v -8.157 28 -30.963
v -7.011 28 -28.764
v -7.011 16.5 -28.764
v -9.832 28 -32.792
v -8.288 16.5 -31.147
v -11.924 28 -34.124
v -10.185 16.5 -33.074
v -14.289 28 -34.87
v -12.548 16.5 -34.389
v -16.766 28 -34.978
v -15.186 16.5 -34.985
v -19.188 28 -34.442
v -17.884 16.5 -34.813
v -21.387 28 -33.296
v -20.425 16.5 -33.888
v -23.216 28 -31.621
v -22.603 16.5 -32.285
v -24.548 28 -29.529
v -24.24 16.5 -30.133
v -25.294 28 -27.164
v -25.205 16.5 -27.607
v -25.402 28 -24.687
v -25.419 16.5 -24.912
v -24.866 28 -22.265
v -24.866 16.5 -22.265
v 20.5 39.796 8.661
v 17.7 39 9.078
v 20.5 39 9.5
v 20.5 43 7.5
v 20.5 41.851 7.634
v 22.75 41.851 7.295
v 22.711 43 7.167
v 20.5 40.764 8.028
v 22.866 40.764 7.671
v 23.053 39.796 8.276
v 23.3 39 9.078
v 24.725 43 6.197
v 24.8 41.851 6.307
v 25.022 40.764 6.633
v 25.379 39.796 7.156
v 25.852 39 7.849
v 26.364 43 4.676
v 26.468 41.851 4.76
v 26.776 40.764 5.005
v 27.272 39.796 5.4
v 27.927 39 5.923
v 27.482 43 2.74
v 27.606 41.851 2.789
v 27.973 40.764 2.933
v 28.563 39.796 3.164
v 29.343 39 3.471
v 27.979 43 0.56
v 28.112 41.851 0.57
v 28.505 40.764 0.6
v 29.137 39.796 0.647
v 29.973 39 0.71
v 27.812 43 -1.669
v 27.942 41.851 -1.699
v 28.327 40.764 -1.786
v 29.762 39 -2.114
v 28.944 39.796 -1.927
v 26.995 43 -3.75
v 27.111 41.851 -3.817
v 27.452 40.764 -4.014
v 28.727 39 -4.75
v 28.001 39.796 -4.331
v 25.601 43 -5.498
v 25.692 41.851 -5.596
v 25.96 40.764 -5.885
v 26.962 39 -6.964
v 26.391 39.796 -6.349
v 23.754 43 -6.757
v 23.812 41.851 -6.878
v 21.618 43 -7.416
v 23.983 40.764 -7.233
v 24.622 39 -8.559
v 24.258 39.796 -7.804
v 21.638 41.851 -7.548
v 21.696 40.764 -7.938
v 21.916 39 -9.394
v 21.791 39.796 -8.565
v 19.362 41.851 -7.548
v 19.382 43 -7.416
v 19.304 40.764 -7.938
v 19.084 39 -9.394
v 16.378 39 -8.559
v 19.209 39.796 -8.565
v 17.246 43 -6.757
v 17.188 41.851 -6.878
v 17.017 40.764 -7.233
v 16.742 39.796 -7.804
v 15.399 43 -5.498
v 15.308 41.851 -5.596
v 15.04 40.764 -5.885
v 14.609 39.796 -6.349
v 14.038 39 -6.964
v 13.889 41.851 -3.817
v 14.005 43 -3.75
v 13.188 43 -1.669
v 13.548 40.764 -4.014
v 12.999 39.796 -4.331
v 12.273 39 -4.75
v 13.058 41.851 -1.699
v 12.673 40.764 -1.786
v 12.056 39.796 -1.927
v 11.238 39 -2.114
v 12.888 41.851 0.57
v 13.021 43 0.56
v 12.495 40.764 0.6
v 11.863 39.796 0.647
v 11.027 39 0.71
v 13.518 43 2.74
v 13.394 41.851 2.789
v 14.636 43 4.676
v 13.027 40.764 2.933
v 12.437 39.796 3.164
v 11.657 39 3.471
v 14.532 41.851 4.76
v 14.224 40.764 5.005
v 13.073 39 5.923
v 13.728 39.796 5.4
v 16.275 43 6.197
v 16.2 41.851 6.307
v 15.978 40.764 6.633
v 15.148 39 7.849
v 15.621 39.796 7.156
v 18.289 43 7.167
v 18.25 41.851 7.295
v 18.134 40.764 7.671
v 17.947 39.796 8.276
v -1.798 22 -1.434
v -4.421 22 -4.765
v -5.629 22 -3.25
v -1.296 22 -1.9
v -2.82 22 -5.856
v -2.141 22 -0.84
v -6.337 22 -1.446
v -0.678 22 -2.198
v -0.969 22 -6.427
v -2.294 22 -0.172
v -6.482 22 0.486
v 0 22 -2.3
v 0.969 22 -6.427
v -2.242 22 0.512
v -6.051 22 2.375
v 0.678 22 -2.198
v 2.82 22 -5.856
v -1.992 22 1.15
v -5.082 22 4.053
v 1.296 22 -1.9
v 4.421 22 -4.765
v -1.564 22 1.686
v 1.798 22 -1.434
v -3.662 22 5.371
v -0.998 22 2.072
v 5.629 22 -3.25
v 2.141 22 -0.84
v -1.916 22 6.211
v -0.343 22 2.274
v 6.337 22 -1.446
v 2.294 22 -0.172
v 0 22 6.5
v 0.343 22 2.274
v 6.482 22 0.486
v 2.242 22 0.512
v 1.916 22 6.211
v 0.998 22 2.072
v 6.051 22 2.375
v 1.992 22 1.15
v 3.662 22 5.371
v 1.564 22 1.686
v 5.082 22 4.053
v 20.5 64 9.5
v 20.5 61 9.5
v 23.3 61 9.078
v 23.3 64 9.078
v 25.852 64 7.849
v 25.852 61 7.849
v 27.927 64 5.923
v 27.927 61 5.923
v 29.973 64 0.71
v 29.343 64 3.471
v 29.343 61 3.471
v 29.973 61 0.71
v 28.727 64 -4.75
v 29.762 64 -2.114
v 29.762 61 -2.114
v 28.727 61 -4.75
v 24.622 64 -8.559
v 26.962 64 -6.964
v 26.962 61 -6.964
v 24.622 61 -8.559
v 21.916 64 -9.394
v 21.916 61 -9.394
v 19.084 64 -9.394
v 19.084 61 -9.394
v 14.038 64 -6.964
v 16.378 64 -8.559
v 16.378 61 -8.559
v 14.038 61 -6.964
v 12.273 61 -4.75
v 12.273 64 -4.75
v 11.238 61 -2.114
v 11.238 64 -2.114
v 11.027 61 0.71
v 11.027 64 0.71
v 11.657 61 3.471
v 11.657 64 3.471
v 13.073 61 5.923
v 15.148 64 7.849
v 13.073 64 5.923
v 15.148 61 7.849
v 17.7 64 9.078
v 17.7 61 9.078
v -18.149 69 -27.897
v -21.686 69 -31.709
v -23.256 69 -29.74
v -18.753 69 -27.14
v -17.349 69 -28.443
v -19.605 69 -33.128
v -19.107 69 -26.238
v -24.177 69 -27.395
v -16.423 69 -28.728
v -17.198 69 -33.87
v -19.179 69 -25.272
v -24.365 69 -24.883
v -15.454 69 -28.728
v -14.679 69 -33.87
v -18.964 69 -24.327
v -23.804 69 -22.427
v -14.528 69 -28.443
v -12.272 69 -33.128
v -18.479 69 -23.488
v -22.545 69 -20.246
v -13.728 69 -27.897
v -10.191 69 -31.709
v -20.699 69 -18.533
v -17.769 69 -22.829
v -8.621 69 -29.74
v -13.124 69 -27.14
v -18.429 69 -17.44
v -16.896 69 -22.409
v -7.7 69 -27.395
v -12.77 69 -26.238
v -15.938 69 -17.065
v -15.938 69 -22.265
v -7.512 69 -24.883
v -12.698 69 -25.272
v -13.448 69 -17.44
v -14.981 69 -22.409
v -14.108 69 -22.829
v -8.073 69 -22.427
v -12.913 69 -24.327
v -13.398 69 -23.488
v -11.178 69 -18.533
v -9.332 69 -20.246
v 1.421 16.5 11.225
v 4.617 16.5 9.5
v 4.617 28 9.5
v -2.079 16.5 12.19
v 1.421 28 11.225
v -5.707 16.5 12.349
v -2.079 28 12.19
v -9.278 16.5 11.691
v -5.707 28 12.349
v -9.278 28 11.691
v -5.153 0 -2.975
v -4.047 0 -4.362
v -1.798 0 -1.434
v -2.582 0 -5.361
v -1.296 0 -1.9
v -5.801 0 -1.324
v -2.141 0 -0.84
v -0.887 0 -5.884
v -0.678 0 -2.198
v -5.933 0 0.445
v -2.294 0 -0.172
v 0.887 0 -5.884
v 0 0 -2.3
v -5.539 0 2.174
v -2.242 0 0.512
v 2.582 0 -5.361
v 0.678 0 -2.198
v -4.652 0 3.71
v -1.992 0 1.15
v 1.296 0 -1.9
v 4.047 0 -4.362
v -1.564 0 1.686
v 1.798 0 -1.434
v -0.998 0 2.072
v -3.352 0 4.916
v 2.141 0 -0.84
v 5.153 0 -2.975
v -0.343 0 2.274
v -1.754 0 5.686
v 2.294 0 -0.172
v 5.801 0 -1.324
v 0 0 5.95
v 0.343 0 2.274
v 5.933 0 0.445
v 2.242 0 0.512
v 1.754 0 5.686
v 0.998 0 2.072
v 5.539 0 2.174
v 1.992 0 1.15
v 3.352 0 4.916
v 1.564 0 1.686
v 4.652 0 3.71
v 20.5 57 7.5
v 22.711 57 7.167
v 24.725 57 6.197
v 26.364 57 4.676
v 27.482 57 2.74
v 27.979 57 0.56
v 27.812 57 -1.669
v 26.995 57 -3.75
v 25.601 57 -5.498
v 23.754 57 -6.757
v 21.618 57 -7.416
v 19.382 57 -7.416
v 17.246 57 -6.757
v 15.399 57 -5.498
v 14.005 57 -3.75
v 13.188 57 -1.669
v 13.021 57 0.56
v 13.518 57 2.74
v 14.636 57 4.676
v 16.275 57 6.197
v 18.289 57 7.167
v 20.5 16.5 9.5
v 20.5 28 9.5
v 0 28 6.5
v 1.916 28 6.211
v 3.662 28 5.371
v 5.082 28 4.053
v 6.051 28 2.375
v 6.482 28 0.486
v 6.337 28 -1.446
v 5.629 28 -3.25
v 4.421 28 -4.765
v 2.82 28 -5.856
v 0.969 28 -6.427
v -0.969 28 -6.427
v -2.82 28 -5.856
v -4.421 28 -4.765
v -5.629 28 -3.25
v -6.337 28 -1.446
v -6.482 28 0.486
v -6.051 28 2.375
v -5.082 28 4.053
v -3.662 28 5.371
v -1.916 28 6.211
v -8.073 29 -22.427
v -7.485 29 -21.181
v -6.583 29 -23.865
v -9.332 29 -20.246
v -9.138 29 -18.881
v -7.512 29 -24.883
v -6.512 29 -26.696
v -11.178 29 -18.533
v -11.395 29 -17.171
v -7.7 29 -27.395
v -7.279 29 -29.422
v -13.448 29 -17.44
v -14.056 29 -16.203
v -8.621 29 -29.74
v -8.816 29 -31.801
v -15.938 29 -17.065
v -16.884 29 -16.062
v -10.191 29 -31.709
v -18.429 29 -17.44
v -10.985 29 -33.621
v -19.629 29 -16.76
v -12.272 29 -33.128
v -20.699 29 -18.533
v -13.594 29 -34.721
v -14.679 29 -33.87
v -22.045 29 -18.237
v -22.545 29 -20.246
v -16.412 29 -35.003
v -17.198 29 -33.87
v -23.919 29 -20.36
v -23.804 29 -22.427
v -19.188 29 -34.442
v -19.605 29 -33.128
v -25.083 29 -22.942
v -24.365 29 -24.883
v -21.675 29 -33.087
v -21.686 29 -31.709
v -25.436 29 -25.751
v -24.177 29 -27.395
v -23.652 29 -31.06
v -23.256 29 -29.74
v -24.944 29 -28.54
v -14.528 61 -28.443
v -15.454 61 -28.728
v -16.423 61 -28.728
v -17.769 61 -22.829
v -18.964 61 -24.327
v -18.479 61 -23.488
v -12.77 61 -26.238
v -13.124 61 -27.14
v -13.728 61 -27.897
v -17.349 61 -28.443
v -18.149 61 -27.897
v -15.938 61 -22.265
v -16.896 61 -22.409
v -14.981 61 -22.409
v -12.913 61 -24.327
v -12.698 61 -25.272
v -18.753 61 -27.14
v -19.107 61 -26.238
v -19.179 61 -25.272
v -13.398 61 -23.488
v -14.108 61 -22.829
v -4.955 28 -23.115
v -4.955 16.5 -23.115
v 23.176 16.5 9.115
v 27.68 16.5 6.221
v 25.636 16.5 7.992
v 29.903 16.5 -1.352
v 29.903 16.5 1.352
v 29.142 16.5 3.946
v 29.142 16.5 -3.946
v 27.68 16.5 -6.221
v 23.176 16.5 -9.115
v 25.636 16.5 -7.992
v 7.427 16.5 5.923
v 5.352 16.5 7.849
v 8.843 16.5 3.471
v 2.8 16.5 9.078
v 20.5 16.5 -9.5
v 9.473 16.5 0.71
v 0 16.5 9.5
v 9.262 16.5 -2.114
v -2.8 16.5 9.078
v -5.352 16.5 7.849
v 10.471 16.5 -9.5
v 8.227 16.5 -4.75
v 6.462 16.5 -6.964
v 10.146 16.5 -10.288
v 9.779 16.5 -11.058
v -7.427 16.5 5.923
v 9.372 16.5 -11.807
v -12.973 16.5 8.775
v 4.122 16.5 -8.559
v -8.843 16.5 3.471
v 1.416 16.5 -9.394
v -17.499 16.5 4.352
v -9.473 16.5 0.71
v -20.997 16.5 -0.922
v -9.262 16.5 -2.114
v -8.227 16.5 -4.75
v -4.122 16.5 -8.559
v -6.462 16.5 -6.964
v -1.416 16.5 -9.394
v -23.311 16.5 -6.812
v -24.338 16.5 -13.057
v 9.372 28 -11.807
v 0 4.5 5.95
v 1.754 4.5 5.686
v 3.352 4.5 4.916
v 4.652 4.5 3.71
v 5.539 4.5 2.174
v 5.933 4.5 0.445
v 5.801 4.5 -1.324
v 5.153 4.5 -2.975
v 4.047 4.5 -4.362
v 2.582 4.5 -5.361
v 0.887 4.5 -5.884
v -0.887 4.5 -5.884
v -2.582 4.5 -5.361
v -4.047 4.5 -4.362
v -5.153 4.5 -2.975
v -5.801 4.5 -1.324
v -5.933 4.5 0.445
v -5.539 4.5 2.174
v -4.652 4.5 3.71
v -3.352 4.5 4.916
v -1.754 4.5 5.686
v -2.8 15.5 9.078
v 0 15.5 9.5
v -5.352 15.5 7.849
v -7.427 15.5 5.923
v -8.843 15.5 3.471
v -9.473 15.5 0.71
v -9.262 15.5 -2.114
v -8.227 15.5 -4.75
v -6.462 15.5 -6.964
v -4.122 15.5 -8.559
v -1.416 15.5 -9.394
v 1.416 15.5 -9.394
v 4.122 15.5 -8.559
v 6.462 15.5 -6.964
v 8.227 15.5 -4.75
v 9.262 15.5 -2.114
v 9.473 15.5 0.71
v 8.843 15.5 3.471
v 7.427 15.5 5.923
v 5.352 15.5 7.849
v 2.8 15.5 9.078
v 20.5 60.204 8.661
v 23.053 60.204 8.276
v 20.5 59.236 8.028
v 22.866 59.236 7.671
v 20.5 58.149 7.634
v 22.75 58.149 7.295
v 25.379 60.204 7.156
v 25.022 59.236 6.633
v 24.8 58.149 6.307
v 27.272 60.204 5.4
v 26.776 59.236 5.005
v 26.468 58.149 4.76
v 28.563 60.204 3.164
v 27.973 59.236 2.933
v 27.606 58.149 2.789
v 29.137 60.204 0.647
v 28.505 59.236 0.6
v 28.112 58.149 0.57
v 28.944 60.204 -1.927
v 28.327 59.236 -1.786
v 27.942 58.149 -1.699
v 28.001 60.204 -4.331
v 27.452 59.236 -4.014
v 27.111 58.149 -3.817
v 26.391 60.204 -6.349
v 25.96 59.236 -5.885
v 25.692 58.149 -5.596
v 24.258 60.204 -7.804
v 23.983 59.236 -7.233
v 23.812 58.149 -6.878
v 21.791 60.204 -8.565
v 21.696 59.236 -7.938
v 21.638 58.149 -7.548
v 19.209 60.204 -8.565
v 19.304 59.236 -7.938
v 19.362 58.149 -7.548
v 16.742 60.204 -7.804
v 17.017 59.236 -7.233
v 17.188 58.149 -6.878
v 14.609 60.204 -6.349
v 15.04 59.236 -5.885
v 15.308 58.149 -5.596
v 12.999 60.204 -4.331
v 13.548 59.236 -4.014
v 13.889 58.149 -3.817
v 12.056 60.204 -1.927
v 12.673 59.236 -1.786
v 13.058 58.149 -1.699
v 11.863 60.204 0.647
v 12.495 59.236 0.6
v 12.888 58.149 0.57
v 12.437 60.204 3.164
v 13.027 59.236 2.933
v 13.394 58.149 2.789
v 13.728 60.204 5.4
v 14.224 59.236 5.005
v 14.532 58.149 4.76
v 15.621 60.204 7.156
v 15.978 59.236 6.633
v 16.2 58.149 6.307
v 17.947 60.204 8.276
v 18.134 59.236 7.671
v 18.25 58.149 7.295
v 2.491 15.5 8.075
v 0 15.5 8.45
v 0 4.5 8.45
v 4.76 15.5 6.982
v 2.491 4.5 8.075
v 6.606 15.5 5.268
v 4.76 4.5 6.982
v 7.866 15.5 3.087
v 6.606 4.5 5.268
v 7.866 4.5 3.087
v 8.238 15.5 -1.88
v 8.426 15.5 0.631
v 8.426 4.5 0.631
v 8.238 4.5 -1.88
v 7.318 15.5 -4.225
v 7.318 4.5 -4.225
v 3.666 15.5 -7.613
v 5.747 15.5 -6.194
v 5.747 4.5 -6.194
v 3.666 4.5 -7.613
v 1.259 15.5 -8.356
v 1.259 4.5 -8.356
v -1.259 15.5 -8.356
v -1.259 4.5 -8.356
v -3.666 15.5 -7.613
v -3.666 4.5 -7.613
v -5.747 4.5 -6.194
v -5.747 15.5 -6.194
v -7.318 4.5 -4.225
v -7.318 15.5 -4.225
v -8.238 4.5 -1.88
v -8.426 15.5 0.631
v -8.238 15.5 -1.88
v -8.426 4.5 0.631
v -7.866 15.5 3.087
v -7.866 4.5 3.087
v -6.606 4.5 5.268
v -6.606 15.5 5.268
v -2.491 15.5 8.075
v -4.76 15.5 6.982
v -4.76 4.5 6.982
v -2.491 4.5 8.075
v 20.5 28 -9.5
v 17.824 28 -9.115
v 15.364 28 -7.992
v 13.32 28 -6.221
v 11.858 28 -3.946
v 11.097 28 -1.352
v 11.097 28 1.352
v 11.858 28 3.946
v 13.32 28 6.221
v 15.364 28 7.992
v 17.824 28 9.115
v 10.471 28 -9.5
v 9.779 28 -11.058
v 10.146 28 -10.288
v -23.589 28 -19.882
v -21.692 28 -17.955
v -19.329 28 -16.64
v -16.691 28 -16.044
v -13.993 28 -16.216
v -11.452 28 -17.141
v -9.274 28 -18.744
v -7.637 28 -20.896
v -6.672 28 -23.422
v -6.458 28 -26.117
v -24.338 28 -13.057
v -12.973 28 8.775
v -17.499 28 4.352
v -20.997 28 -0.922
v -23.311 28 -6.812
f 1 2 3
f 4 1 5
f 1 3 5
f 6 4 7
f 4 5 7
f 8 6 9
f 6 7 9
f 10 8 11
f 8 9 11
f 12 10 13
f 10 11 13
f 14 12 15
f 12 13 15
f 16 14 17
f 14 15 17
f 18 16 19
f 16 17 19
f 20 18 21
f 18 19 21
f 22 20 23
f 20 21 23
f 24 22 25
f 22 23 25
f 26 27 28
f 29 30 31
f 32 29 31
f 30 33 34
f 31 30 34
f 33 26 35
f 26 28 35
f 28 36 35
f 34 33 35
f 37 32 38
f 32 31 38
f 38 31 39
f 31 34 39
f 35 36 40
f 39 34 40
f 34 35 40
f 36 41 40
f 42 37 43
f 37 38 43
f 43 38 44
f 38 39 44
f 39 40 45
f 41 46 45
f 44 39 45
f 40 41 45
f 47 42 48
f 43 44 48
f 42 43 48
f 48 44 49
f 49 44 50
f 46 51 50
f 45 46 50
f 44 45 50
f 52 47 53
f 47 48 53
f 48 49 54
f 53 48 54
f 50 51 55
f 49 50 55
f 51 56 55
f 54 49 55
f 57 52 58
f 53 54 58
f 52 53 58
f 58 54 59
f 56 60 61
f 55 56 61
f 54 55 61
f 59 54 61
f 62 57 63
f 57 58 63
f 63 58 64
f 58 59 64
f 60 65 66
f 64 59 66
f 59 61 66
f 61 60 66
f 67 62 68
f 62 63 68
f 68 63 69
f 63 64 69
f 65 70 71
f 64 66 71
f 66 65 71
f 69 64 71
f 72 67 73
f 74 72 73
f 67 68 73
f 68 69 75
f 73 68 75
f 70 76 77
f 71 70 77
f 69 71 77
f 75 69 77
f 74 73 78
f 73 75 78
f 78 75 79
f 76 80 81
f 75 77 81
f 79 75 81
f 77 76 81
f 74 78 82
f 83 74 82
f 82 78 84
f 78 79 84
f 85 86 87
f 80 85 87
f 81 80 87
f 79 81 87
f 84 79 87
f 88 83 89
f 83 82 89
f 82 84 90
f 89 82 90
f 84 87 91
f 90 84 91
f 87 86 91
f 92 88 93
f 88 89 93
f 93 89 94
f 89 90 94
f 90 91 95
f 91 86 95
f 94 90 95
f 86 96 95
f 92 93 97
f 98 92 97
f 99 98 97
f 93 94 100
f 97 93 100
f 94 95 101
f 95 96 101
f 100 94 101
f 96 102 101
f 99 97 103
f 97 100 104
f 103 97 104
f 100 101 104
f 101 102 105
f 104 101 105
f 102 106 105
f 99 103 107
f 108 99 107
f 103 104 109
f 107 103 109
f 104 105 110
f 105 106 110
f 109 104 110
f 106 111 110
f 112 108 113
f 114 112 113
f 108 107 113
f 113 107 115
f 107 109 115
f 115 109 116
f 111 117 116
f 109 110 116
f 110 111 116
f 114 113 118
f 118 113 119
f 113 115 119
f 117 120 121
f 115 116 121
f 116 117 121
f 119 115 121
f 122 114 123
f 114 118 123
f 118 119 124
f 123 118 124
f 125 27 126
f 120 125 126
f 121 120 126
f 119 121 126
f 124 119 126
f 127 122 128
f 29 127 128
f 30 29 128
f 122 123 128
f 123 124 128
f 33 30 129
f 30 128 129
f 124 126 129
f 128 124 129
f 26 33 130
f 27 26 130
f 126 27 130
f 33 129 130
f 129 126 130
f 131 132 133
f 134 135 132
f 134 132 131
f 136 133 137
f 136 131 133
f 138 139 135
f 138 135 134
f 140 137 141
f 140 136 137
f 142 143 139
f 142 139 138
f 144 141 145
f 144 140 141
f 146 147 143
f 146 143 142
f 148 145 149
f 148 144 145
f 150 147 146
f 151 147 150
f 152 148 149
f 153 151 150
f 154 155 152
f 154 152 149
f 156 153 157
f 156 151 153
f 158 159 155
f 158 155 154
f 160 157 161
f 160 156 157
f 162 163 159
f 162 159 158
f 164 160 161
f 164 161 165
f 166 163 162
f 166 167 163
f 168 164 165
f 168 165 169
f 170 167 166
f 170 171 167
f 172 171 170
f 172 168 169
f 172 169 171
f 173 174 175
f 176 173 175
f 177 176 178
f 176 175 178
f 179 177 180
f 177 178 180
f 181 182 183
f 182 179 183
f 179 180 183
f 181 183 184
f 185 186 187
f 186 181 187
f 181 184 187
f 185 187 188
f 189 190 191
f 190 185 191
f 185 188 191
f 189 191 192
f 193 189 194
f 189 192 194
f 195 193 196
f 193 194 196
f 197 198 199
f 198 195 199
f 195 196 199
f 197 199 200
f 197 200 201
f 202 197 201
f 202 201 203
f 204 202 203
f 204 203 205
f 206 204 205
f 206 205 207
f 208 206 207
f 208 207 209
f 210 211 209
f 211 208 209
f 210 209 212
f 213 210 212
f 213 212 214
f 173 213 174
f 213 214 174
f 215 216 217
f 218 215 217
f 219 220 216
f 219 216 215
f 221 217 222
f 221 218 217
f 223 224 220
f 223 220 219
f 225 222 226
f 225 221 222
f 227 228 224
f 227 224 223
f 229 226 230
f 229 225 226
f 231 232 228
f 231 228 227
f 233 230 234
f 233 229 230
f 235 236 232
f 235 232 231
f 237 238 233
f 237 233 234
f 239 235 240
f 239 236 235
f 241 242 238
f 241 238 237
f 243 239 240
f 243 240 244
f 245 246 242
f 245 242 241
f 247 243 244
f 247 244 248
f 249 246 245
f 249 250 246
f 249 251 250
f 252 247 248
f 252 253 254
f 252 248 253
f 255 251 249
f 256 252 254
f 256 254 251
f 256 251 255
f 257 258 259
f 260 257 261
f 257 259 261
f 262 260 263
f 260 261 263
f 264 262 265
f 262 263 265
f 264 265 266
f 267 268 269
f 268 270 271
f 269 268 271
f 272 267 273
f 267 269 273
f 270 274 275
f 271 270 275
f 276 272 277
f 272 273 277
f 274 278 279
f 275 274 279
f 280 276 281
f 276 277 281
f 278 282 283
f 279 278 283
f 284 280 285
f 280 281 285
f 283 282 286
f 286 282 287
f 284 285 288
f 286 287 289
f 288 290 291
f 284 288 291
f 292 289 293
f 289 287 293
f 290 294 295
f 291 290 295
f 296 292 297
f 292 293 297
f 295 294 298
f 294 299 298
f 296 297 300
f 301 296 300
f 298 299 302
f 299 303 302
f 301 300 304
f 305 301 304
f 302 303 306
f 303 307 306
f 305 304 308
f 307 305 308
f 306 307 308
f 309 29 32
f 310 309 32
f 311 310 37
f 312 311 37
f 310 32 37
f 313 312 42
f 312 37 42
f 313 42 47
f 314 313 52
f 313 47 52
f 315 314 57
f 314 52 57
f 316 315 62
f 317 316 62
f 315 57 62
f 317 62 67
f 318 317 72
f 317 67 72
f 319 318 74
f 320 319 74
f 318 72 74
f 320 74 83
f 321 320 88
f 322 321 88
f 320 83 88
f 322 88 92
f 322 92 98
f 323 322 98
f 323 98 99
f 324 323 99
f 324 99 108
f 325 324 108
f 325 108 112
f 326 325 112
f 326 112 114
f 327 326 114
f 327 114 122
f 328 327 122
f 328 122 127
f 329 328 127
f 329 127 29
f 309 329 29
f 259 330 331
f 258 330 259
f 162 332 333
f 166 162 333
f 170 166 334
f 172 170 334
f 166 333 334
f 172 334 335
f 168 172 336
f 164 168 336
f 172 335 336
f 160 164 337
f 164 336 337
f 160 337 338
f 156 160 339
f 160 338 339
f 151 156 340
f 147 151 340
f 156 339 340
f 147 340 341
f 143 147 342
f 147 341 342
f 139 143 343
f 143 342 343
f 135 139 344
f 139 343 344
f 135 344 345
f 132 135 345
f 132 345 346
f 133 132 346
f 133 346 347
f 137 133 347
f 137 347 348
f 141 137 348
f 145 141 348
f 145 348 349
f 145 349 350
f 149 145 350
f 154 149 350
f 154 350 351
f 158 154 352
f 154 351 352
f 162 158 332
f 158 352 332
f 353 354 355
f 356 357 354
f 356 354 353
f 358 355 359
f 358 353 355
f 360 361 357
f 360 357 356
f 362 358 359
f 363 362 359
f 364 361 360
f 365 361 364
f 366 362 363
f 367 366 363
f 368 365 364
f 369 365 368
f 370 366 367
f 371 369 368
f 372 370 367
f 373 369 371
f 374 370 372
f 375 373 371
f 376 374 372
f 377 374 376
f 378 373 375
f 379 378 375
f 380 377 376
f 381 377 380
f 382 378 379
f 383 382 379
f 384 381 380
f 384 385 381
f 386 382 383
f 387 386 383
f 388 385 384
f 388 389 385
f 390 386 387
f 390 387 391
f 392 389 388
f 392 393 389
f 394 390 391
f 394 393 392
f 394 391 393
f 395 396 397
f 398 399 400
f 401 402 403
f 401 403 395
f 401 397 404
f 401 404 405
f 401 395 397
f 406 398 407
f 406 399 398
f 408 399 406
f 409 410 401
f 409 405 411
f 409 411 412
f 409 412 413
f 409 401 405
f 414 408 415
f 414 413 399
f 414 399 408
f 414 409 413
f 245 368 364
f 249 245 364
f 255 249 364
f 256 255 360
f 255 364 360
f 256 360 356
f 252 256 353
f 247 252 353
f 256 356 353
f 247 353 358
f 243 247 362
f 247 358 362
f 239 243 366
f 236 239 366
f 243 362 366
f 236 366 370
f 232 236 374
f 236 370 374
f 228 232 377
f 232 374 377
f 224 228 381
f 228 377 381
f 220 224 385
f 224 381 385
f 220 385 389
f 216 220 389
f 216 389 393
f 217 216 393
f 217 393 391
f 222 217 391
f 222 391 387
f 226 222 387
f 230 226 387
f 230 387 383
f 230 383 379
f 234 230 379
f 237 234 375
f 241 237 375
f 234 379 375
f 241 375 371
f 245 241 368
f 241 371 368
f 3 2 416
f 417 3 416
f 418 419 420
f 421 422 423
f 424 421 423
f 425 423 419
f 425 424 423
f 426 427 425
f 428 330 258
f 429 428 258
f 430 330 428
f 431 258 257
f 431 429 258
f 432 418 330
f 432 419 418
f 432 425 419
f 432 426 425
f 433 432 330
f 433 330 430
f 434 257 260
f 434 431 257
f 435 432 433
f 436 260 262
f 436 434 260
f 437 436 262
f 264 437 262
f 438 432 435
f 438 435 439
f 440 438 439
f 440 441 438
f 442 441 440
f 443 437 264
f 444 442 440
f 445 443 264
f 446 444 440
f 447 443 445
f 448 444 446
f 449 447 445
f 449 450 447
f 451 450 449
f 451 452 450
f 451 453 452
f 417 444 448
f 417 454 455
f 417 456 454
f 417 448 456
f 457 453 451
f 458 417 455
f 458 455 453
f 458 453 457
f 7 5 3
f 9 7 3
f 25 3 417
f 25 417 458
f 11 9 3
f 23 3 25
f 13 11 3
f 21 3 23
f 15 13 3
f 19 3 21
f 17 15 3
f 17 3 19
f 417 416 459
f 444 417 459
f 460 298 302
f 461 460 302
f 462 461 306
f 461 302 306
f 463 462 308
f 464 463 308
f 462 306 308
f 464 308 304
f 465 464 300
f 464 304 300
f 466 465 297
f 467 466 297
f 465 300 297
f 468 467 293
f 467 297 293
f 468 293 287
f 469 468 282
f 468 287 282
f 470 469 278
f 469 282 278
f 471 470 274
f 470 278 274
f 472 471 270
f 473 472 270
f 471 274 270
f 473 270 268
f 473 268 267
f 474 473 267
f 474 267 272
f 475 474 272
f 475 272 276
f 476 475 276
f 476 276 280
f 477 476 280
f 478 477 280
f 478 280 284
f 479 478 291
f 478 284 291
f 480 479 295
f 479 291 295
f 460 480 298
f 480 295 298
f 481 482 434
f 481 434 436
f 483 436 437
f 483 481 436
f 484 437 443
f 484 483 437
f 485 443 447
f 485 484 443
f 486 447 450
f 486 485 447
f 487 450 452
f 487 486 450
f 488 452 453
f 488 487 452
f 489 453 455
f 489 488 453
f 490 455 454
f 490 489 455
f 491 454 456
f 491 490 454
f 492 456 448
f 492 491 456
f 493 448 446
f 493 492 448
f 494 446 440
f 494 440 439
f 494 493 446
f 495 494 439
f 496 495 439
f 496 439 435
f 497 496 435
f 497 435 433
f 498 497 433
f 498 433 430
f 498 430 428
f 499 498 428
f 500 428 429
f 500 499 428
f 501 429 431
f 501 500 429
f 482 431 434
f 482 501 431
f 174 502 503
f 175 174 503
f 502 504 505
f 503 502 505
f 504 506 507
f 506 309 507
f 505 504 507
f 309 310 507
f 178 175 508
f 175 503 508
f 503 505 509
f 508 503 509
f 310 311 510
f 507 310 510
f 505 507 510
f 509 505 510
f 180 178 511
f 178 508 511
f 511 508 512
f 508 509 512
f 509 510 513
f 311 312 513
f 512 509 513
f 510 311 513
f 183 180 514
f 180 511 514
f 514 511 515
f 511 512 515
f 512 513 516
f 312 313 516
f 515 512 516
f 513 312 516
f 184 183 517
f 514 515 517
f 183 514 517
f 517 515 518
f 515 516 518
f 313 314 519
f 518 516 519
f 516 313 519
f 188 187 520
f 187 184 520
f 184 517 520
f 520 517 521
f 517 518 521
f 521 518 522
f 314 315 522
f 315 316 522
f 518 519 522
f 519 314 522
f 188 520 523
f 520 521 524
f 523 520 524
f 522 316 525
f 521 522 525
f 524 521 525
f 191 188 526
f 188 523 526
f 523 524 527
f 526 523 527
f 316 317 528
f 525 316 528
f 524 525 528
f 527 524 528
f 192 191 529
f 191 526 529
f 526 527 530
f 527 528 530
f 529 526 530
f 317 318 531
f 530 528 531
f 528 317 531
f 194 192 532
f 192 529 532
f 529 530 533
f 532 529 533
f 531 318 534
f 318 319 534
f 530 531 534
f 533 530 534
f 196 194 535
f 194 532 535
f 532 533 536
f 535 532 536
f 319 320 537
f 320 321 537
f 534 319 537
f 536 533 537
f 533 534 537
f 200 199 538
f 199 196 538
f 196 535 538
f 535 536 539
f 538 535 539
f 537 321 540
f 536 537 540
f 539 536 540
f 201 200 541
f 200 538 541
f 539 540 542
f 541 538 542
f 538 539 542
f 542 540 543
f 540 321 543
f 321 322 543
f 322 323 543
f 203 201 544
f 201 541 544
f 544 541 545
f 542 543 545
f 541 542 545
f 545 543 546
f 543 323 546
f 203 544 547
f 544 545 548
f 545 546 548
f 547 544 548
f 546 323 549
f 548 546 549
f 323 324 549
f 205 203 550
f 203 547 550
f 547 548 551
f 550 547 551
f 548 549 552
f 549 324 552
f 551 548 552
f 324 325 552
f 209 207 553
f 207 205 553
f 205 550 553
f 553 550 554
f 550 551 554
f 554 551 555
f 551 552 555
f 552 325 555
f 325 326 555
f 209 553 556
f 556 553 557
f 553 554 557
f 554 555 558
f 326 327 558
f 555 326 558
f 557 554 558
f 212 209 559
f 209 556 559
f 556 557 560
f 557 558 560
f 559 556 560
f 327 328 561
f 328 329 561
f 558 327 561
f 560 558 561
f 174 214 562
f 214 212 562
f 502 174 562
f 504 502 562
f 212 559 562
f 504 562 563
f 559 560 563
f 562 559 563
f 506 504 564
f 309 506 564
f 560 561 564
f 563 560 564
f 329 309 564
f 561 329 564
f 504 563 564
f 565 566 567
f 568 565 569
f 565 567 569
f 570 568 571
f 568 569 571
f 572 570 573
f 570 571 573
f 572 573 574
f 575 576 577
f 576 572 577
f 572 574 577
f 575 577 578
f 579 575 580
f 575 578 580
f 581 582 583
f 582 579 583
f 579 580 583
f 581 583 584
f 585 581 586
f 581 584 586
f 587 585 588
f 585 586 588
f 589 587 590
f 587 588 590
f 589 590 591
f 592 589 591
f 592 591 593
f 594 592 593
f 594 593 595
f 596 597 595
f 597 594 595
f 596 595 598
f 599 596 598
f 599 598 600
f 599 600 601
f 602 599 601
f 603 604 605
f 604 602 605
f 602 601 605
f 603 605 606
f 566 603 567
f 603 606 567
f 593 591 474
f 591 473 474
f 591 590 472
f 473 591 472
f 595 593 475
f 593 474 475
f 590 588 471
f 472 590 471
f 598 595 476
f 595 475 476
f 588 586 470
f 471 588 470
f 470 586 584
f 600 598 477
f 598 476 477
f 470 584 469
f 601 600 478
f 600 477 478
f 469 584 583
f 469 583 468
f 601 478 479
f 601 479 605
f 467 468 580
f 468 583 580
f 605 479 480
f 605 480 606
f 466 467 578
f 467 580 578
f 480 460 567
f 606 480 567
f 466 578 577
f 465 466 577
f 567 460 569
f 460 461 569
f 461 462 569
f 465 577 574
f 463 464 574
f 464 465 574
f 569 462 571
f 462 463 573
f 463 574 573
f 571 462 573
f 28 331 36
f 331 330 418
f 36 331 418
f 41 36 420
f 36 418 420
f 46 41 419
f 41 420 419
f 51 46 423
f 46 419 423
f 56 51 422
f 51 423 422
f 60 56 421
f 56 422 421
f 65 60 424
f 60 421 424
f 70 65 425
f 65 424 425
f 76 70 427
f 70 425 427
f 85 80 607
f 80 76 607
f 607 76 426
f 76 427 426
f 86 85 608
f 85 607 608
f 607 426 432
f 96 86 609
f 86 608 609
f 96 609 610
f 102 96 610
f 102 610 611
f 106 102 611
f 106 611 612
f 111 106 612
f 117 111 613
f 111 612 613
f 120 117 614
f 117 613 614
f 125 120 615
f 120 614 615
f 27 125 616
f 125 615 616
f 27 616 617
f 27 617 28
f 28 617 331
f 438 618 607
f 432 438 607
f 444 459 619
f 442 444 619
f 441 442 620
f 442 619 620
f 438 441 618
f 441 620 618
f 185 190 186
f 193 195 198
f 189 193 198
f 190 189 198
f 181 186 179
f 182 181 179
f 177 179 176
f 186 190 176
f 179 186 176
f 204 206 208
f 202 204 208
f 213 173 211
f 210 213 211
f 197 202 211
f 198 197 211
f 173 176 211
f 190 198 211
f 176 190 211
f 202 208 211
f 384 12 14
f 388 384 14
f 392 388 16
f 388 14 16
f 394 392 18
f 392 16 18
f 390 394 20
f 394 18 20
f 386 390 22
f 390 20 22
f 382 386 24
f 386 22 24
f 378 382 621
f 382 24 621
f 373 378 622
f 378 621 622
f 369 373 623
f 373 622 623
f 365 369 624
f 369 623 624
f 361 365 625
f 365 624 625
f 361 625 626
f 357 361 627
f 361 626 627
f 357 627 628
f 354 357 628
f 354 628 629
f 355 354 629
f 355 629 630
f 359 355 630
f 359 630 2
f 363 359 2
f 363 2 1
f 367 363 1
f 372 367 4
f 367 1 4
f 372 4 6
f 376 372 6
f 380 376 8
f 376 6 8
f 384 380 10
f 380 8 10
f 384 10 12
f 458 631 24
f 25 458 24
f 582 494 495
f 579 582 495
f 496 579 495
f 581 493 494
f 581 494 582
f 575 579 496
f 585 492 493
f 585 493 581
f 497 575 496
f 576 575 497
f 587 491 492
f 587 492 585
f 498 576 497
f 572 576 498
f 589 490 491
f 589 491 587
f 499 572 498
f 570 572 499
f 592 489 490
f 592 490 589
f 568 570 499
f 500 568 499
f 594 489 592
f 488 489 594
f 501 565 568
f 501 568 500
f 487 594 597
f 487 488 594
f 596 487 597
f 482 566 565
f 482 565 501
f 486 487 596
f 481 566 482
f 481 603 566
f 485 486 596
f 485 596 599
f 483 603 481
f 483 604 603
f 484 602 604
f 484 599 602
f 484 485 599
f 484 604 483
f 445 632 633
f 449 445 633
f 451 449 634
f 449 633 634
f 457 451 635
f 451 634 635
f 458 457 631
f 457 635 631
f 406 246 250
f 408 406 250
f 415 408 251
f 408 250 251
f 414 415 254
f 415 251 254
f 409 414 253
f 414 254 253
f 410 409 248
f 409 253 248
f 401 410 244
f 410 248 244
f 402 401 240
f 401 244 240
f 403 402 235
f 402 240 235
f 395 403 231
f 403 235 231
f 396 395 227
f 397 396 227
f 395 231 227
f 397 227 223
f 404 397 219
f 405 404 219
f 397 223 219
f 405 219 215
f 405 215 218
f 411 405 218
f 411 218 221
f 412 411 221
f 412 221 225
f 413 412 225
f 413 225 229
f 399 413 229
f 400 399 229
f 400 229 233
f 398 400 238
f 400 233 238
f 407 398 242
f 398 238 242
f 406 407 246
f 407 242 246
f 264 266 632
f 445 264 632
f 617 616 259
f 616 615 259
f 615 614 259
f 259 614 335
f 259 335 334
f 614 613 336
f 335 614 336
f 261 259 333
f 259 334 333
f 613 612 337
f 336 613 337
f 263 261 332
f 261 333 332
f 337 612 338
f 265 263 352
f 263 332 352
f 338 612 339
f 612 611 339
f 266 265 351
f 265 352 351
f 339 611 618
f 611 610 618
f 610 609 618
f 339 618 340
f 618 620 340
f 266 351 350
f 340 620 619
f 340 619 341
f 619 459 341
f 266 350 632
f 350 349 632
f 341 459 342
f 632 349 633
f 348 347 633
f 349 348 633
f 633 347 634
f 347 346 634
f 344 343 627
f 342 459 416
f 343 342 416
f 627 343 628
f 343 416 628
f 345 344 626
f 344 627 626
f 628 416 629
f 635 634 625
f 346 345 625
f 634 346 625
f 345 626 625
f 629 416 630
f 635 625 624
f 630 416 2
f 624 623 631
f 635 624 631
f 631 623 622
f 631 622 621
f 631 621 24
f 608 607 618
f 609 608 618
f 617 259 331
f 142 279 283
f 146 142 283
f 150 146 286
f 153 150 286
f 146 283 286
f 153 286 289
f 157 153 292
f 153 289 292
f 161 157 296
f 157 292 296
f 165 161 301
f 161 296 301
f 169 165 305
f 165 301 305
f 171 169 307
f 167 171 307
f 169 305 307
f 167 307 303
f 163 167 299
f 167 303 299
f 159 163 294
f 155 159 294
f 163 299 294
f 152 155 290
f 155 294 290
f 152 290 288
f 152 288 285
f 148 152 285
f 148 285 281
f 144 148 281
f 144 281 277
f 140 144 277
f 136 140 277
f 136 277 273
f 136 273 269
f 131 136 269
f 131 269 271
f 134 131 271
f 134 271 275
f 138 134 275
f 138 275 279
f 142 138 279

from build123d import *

# Parameters (mm, degrees)
SKETCH_1_R           = 5.95
EXTRUDE_1_DEPTH      = 4.5
SKETCH_4_R           = 8.45
EXTRUDE_4_DEPTH      = 17.75
EXTRUDE_6_DEPTH      = 5.75
EXTRUDE_6_DEPTH_BACK = 5.75
SKETCH_12_R          = 9.5
EXTRUDE_10_DEPTH     = 1
SKETCH_7_R           = 2.3
CUT_EXTRUDE_1_DEPTH  = 57.22806055
SKETCH_8_R           = 6.5
CUT_EXTRUDE_2_DEPTH  = 6
SKETCH_9_R           = 9.5
EXTRUDE_7_DEPTH      = 36
SKETCH_10_R          = 8.45
EXTRUDE_8_DEPTH      = 40
EXTRUDE_START        = 1
SKETCH_13_R          = 9.5
SKETCH_13_R_2        = 2.3
EXTRUDE_11_DEPTH     = 1
SKETCH_14_R          = 3.25
CUT_EXTRUDE_3_DEPTH  = 8
CUT_EXTRUDE_START    = -18
CUT_EXTRUDE_4_DEPTH  = 18
CUT_EXTRUDE_START_2  = 11
SKETCH_16_R          = 14.956390748
SKETCH_16_R_2        = 7.5
CUT_EXTRUDE_5_DEPTH  = 22
FILLET_2_R           = 5
SKETCH_17_R          = 7.5
EXTRUDE_12_DEPTH     = 11.5


with BuildPart() as part:
    # Эскиз1 → Бобышка-Вытянуть1 (new body)
    with BuildSketch(Plane(origin=(0, 0, 0), x_dir=(1, 0, 0), z_dir=(0, 1, 0))):
        with Locations(Location((0, 0, 0), (0, 0, 270))):
            Circle(SKETCH_1_R)
    extrude(amount=EXTRUDE_1_DEPTH)

    # Эскиз4 → Бобышка-Вытянуть4 (add)
    with BuildSketch(Plane(origin=(0, 4.5, 0), x_dir=(1, 0, 0), z_dir=(0, 1, 0))):
        with Locations(Location((0, 0, 0), (0, 0, 270))):
            Circle(SKETCH_4_R)
    extrude(amount=EXTRUDE_4_DEPTH)

    # Эскиз6 → Бобышка-Вытянуть6 (add, two sides: drawn at the far end of the back side and taken through both)
    with BuildSketch(Plane(origin=(0, 22.25, 0), x_dir=(1, 0, 0), z_dir=(0, 1, 0)).offset(-EXTRUDE_6_DEPTH_BACK)):
        with BuildLine():
            Line((0, -9.5), (-0.833655922, -9.5))
            ThreePointArc((-0.833655922, -9.5), (-3.331132848, -9.18310947), (-5.670324417, -8.252521801))
            ThreePointArc((-5.670324417, -8.252521801), (-13.556905273, -2.05094269), (-19.066851837, 6.333461279))
            Line((-19.066851837, 6.333461279), (-28.114764095, 31.1923959))
            Line((-28.114764095, 31.1923959), (-10.2606043, 37.690778624))
            Line((-10.2606043, 37.690778624), (-2.394850826, 16.079798567))
            ThreePointArc((-2.394850826, 16.079798567), (1.266311019, 11.308479557), (7.002075382, 9.5))
            Line((7.002075382, 9.5), (30, 9.5))
            Line((30, 9.5), (30, -9.5))
            Line((30, -9.5), (0, -9.5))
        make_face()
    extrude(amount=EXTRUDE_6_DEPTH + EXTRUDE_6_DEPTH_BACK)

    # Эскиз12 → Бобышка-Вытянуть10 (add)
    with BuildSketch(Plane(origin=(0, 28, 0), x_dir=(1, 0, 0), z_dir=(0, 1, 0))):
        with Locations(Location((-15.938492836, 25.514507365, 0), (0, 0, 110))):
            Circle(SKETCH_12_R)
    extrude(amount=EXTRUDE_10_DEPTH)

    # Эскиз7 → Вырез-Вытянуть1 (cut, through all)
    with BuildSketch(Plane.XZ):
        with Locations(Location((0, 0, 0), (0, 0, 270))):
            Circle(SKETCH_7_R)
    extrude(amount=-CUT_EXTRUDE_1_DEPTH, mode=Mode.SUBTRACT)

    # Эскиз8 → Вырез-Вытянуть2 (cut)
    with BuildSketch(Plane(origin=(0, 28, 0), x_dir=(1, 0, 0), z_dir=(0, 1, 0))):
        with Locations(Location((0, 0, 0), (0, 0, 270))):
            Circle(SKETCH_8_R)
    extrude(amount=-CUT_EXTRUDE_2_DEPTH, mode=Mode.SUBTRACT)

    # Эскиз9 → Бобышка-Вытянуть7 (add)
    with BuildSketch(Plane.XZ.offset(-28)):
        with Locations(Location((20.5, 0, 0), (0, 0, 90))):
            Circle(SKETCH_9_R)
    extrude(amount=-EXTRUDE_7_DEPTH)

    # Эскиз10 → Бобышка-Вытянуть8 (add)
    with BuildSketch(Plane(origin=(0, 29, 0), x_dir=(1, 0, 0), z_dir=(0, 1, 0))):
        with Locations(Location((-15.938492836, 25.514507365, 0), (0, 0, 270))):
            Circle(SKETCH_10_R)
    extrude(amount=EXTRUDE_8_DEPTH)

    # Эскиз13 → Бобышка-Вытянуть11 (add)
    with BuildSketch(Plane.XZ.offset(-16.5).offset(EXTRUDE_START)):
        with Locations(Location((0, 0, 0), (0, 0, 90))):
            Circle(SKETCH_13_R)
        with Locations(Location((0, 0, 0), (0, 0, 270))):
            Circle(SKETCH_13_R_2, mode=Mode.SUBTRACT)
    extrude(amount=-EXTRUDE_11_DEPTH)

    # Эскиз14 → Вырез-Вытянуть3 (cut)
    with BuildSketch(Plane(origin=(0, 69, 0), x_dir=(1, 0, 0), z_dir=(0, 1, 0))):
        with Locations(Location((-15.938492836, 25.514507365, 0), (0, 0, 270))):
            Circle(SKETCH_14_R)
    extrude(amount=-CUT_EXTRUDE_3_DEPTH, mode=Mode.SUBTRACT)

    # Эскиз15 → Вырез-Вытянуть4 (cut)
    with BuildSketch(Plane(origin=(0, 28, 0), x_dir=(1, 0, 0), z_dir=(0, 1, 0)).offset(CUT_EXTRUDE_START)):
        with BuildLine():
            Line((-24.865572733, 22.265316003), (-35.336248809, 21.155444764))
            Line((-35.336248809, 21.155444764), (-35.336248809, 37.040132254))
            Line((-35.336248809, 37.040132254), (1.913807819, 42.427920993))
            Line((1.913807819, 42.427920993), (-7.011412938, 28.763698726))
            ThreePointArc((-7.011412938, 28.763698726), (-19.187684197, 34.441587262), (-24.865572733, 22.265316003))
        make_face()
        with BuildLine():
            Line((20.5, 9.5), (21.51421168, 16.603692208))
            Line((21.51421168, 16.603692208), (46.391879719, 13.051846104))
            Line((46.391879719, 13.051846104), (43.436938274, -14.794111134))
            Line((43.436938274, -14.794111134), (20.5, -14.236753678))
            Line((20.5, -14.236753678), (20.5, -9.5))
            ThreePointArc((20.5, -9.5), (30, 0), (20.5, 9.5))
        make_face()
    extrude(amount=CUT_EXTRUDE_4_DEPTH, mode=Mode.SUBTRACT)

    # Эскиз16 → Вырез-Вытянуть5 (cut)
    with BuildSketch(Plane(origin=(0, 28, 0), x_dir=(1, 0, 0), z_dir=(0, 1, 0)).offset(CUT_EXTRUDE_START_2)):
        with Locations((20.5, 0)):
            Circle(SKETCH_16_R)
        with Locations(Location((20.5, 0, 0), (0, 0, 270))):
            Circle(SKETCH_16_R_2, mode=Mode.SUBTRACT)
    extrude(amount=CUT_EXTRUDE_5_DEPTH, mode=Mode.SUBTRACT)

    # Скругление2
    # the kernel refuses this fillet: 5 mm, written as the material it adds along each edge
    with BuildSketch(Plane(origin=(20.5, 39, 0), x_dir=(0, 0, 1), z_dir=(-1, 0, 0))) as fillet_2_piece_1:
        with BuildLine():
            CenterArc((12.5, 4), FILLET_2_R, 180, 53.130102354)
            Line((7.5, 4), (7.4, 4))
            Line((7.4, 4), (7.4, 0))
            Line((7.4, 0), (7.5, -0.1))
            ThreePointArc((7.5, -0.1), (8.5, -0.1), (9.44, -0.08))
            Line((9.44, -0.08), (9.5, 0))
        make_face()
    revolve(axis=Axis((20.5, 39, 0), (0, 1, 0)))
    with BuildSketch(Plane(origin=(20.5, 61, 0), x_dir=(0, 0, 1), z_dir=(-1, 0, 0))) as fillet_2_piece_2:
        with BuildLine():
            CenterArc((12.5, -4), FILLET_2_R, 126.869897646, 53.130102354)
            Line((9.5, 0), (9.44, 0.08))
            ThreePointArc((9.44, 0.08), (8.5, 0.1), (7.5, 0.1))
            Line((7.5, 0.1), (7.4, 0))
            Line((7.4, 0), (7.4, -4))
            Line((7.4, -4), (7.5, -4))
        make_face()
    revolve(axis=Axis((20.5, 61, 0), (0, 1, 0)))

    # Эскиз17 → Бобышка-Вытянуть12 (add)
    with BuildSketch(Plane(origin=(0, 28, 0), x_dir=(1, 0, 0), z_dir=(0, 1, 0))):
        with BuildLine():
            Line((-9.278482036, -11.69085434), (-12.972576627, -8.775389277))
            ThreePointArc((-12.972576627, -8.775389277), (-20.997261978, 0.921608959), (-24.337711873, 13.057042378))
            Line((-24.337711873, 13.057042378), (-24.865572733, 22.265316003))
            Line((-24.865572733, 22.265316003), (-5.413533881, 23.476451416))
            Line((-5.413533881, 23.476451416), (9.371872764, 11.807465836))
            ThreePointArc((9.371872764, 11.807465836), (8.040562687, -6.286337643), (-9.278482036, -11.69085434))
        make_face()
        Circle(SKETCH_17_R, mode=Mode.SUBTRACT)
    extrude(amount=-EXTRUDE_12_DEPTH)


solid = part.part
